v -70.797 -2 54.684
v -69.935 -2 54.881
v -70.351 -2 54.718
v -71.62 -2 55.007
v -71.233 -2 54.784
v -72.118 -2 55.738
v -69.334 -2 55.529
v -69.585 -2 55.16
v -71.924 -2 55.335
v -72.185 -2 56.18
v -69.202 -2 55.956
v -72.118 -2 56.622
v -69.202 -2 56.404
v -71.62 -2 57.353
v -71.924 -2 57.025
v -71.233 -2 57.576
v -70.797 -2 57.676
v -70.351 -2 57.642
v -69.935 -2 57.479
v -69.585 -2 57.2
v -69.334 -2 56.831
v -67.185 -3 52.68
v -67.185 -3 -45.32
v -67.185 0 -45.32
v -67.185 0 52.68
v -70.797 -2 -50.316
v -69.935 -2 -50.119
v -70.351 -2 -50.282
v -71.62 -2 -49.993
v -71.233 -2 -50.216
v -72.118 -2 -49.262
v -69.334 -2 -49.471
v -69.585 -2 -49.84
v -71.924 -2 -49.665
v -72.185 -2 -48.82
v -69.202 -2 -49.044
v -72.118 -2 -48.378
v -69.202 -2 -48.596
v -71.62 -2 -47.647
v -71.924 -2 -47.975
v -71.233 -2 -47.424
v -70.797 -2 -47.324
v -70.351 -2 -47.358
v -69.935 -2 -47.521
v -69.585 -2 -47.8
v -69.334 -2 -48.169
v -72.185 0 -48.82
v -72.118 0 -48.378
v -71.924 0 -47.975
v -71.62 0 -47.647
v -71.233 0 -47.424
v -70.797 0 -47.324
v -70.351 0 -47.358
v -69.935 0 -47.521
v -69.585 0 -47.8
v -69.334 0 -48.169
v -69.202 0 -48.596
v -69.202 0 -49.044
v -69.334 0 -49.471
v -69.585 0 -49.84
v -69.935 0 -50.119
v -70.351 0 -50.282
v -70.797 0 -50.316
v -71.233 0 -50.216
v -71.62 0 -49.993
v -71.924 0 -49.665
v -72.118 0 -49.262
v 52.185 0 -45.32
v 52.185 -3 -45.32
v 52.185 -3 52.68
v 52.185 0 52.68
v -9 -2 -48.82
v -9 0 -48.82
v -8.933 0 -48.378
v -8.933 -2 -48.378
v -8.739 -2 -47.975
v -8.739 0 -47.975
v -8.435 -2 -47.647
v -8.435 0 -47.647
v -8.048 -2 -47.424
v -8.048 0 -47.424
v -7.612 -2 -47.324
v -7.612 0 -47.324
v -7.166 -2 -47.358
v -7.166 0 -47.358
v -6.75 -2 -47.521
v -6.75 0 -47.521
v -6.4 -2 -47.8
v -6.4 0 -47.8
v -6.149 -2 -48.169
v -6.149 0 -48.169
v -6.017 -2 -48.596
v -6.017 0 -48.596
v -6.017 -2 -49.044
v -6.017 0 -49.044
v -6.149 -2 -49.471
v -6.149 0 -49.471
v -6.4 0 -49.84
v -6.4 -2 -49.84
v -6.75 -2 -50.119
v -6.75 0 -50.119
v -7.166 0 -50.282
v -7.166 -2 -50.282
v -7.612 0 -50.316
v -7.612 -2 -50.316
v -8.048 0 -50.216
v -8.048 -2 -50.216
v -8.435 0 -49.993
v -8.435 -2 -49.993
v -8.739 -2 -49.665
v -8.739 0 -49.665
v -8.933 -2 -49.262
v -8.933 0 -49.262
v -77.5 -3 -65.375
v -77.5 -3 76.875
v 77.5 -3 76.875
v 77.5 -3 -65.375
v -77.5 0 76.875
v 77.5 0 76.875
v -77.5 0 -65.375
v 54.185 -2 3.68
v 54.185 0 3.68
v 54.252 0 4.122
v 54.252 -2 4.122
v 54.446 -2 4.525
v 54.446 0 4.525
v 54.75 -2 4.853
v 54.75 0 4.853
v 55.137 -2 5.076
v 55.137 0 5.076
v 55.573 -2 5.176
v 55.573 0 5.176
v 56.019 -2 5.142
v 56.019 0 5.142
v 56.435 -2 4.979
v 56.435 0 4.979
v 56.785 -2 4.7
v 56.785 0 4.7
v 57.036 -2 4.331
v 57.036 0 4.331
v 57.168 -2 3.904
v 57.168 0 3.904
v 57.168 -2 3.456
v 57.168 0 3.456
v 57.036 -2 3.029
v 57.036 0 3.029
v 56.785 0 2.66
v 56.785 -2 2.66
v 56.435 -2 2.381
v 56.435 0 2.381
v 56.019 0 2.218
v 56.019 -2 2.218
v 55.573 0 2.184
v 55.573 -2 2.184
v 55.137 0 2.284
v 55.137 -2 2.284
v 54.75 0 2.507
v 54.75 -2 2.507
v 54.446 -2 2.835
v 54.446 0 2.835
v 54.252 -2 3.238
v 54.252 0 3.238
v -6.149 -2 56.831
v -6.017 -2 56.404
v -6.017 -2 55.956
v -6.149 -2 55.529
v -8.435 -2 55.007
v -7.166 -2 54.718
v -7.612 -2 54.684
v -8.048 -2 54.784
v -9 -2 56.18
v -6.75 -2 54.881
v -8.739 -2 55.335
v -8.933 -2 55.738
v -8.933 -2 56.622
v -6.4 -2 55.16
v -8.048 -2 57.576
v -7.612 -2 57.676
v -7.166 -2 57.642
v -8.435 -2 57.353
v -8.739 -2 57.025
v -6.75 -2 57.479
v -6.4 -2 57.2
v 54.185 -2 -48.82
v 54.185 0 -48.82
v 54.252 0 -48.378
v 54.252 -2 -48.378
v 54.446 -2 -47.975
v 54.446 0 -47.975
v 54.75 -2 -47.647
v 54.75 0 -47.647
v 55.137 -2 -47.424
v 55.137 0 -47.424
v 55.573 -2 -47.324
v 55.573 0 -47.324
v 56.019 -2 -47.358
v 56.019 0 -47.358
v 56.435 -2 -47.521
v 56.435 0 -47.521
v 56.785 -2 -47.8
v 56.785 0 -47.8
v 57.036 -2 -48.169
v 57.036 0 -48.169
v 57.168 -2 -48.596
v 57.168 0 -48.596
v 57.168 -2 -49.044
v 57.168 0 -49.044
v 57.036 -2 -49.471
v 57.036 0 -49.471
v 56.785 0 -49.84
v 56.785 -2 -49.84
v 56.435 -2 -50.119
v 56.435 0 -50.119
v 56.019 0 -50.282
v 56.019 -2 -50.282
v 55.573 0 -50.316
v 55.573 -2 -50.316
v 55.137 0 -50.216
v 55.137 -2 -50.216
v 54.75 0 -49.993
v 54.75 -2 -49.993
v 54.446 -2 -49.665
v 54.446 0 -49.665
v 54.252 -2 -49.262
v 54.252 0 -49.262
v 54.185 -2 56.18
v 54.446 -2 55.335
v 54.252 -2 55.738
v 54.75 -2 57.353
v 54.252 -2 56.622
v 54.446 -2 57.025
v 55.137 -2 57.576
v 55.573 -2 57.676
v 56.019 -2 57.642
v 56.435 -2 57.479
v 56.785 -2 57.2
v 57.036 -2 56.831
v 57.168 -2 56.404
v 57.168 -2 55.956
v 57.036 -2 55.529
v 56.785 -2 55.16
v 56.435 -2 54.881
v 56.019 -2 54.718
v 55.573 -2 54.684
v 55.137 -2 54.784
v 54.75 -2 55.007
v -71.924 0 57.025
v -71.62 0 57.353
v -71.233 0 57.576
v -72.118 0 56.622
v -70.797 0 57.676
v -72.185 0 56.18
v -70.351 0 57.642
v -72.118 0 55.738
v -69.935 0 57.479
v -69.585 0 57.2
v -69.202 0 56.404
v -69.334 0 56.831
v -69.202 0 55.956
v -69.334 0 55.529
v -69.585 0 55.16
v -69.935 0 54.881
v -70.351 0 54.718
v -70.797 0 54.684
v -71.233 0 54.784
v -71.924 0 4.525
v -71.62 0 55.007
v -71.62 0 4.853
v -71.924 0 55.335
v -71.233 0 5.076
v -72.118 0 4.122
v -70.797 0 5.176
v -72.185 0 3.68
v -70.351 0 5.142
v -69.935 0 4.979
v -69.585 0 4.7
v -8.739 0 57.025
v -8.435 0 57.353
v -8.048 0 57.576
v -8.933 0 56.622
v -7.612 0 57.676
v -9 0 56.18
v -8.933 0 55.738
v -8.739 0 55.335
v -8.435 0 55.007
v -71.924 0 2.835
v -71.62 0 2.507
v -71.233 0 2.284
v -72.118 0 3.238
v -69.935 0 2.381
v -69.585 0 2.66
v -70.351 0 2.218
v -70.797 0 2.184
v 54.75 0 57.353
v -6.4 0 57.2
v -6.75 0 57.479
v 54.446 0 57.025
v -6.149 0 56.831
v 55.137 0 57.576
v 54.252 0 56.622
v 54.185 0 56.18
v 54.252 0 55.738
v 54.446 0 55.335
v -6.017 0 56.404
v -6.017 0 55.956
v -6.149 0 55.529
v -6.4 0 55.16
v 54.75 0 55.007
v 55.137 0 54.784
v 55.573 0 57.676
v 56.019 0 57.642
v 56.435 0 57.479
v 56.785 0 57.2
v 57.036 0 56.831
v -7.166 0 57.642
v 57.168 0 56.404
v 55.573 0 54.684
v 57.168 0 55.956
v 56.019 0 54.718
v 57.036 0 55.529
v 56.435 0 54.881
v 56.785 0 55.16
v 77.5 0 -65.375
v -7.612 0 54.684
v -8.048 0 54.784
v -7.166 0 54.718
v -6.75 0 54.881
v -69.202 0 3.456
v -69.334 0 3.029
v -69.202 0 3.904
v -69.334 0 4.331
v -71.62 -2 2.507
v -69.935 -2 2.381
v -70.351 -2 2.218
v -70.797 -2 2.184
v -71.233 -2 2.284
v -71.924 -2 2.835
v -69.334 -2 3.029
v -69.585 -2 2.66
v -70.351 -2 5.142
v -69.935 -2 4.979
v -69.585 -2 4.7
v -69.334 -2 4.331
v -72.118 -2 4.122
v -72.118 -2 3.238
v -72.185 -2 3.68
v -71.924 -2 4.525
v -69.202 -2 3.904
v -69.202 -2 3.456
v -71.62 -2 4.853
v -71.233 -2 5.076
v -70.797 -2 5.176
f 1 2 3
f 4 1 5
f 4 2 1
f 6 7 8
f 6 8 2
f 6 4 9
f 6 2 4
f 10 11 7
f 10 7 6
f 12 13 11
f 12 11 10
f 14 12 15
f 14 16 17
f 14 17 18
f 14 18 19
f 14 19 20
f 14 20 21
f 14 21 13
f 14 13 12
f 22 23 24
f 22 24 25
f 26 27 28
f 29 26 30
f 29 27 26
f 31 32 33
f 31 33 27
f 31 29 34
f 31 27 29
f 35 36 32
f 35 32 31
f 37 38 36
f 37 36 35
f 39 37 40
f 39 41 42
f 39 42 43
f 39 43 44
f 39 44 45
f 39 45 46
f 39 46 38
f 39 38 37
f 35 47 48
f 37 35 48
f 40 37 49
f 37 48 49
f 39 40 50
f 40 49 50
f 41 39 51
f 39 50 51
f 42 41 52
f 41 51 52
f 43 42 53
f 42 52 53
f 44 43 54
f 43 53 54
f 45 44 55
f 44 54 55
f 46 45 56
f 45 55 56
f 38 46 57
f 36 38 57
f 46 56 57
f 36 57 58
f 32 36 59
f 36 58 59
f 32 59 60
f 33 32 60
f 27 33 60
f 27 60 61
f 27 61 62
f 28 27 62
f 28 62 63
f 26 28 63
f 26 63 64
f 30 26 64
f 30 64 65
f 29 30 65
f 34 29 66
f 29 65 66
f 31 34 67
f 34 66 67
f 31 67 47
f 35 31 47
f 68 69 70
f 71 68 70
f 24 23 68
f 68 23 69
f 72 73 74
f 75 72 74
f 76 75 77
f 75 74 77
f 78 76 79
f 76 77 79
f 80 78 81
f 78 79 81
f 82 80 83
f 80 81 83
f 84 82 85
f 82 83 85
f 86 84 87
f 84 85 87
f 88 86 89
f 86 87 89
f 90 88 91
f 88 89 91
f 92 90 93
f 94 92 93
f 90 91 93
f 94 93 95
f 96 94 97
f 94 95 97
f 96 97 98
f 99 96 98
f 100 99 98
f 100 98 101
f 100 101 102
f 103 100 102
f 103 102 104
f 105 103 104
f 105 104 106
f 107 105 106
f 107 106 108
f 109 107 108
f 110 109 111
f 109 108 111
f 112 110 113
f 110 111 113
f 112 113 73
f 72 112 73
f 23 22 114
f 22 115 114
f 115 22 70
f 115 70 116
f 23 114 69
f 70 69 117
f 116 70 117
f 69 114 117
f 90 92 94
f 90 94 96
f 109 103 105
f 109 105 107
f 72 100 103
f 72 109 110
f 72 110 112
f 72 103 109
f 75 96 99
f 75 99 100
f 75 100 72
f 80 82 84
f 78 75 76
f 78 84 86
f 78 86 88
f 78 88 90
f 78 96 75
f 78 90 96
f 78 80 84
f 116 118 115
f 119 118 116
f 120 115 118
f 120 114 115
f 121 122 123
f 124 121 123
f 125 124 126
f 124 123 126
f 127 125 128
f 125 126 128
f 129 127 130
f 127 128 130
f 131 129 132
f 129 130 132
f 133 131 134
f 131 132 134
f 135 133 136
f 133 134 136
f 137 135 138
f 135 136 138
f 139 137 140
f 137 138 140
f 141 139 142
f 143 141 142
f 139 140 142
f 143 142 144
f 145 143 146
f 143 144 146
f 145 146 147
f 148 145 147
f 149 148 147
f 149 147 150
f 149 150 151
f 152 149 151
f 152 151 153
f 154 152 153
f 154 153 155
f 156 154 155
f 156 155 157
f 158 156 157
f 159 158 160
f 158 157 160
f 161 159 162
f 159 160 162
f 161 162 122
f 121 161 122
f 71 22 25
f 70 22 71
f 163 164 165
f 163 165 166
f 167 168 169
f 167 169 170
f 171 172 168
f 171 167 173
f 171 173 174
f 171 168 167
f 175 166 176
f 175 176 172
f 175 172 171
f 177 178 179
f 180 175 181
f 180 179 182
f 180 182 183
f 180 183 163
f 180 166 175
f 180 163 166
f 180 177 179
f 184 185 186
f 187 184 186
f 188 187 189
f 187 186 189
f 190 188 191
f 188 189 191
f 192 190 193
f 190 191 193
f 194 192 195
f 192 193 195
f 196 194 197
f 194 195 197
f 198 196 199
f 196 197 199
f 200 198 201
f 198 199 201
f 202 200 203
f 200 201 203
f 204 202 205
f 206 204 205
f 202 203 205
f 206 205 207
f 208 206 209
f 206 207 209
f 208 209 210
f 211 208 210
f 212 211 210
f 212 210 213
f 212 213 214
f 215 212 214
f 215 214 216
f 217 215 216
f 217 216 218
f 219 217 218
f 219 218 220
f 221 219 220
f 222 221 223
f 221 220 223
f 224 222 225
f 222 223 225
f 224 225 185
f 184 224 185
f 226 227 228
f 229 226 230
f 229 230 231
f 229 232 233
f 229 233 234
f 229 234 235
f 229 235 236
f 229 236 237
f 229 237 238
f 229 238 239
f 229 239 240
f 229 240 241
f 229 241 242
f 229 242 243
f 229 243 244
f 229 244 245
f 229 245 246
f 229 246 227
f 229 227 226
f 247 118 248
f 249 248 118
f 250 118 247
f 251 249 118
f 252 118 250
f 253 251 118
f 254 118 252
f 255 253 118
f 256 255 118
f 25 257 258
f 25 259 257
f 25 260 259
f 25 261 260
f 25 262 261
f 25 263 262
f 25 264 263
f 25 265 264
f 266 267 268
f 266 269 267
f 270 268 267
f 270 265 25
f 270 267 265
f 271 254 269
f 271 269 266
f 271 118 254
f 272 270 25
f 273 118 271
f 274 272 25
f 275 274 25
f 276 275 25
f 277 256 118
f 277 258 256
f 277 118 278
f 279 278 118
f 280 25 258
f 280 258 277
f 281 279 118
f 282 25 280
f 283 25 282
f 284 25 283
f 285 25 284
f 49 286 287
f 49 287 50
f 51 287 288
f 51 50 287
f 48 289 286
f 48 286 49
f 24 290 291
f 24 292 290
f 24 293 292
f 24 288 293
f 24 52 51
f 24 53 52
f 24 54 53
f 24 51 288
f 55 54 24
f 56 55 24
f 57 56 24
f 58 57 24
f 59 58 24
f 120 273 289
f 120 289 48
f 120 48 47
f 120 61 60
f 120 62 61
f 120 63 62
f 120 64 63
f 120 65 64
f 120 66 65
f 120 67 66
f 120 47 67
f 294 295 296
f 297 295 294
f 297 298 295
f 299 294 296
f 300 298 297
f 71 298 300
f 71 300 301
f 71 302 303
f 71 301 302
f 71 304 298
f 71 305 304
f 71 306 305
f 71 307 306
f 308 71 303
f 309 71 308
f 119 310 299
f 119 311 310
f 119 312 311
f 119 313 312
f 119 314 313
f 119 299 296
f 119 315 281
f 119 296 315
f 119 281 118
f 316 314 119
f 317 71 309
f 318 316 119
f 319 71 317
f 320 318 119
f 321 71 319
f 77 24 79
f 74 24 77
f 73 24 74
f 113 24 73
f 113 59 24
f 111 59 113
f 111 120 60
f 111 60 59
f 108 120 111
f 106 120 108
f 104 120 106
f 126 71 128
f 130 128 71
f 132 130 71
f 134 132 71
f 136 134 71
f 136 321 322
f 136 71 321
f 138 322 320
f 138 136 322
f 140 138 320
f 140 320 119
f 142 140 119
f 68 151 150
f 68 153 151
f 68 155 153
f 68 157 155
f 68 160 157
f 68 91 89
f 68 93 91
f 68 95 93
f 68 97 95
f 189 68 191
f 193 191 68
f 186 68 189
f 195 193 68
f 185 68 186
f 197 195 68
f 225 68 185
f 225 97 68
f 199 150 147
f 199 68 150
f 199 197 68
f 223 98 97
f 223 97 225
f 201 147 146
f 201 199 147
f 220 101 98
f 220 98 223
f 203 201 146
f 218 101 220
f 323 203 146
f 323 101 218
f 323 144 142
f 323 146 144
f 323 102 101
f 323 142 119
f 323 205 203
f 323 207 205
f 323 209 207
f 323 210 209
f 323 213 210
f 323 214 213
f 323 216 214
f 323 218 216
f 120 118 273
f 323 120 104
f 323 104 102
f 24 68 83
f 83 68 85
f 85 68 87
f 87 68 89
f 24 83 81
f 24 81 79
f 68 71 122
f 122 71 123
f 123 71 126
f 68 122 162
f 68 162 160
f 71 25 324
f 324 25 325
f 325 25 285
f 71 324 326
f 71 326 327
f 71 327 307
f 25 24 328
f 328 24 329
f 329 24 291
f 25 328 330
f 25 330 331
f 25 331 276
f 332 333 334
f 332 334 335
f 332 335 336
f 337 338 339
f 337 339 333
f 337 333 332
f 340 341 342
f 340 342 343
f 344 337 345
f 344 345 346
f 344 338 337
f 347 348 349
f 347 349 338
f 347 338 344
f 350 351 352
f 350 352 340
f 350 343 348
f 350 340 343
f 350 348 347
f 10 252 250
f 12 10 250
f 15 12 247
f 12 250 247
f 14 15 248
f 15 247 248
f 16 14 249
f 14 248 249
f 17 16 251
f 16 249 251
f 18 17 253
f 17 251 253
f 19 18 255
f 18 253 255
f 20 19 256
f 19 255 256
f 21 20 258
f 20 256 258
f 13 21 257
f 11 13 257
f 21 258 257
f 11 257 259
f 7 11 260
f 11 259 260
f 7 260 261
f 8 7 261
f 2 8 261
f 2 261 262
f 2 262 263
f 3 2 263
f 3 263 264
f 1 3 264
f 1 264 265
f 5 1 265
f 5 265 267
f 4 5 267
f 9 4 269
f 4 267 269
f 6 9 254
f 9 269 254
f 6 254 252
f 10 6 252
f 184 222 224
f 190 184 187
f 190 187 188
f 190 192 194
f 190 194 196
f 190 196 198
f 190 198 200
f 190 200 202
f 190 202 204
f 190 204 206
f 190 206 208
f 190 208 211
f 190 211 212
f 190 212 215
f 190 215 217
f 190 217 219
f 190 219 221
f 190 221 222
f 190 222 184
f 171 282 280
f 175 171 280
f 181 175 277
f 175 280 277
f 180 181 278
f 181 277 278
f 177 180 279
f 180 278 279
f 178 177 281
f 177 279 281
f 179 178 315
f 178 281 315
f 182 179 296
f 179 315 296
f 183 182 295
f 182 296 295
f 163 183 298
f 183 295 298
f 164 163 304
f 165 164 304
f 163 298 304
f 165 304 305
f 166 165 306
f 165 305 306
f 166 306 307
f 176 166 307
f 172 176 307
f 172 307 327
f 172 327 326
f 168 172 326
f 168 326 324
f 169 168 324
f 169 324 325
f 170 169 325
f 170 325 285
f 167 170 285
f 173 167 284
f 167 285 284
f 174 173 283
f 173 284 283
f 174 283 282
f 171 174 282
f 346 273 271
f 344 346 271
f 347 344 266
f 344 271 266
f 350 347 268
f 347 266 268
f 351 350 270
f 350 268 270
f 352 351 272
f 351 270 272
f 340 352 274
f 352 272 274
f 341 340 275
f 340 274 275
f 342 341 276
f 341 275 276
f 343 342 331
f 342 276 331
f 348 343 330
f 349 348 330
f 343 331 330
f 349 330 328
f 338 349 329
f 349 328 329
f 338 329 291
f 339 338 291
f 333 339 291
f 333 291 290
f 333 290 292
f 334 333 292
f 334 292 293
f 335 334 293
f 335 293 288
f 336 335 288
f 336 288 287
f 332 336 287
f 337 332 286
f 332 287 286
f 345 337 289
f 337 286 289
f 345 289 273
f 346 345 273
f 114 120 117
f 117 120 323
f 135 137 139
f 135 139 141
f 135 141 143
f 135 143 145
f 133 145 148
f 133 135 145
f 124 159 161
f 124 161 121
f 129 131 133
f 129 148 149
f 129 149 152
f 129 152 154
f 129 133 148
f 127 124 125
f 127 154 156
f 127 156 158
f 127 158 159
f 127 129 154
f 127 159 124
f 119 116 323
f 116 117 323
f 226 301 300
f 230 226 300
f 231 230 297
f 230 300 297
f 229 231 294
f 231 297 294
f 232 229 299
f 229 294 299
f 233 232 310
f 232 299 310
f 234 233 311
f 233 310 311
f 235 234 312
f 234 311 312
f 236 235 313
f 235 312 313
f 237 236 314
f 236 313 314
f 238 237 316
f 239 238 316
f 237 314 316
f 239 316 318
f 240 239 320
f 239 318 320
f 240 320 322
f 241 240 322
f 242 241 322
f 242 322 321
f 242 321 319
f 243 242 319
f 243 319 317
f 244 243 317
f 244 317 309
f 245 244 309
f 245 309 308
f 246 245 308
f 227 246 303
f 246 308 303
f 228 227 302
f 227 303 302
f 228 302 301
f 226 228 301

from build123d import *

# Parameters (mm, degrees)
F0_W     = 155
F0_H     = 130.75
F1_DEPTH = 3
F2_W     = 113.37
F2_H     = 92
F3_DEPTH = 25
F4_W     = 119.37
F4_H     = 98
F5_DEPTH = 25
F6_R     = 1.5
F7_DEPTH = 2
F8_W     = 155
F8_H     = 3
F9_DEPTH = 11.5


with BuildPart() as f1:
    # F0 (on Front) → F1 (new body)
    with BuildSketch(Plane.XZ):
        Rectangle(F0_W, F0_H)
    extrude(amount=F1_DEPTH)

    # F2 (on face) → F3 (cut)
    with BuildSketch(Plane(origin=(0, 0, 0), x_dir=(-1, 0, 0), z_dir=(0, 1, 0))):
        with Locations((7.5, 3.68)):
            Rectangle(F2_W, F2_H)
    extrude(amount=-F3_DEPTH, mode=Mode.SUBTRACT)

    # F4 (on face) → F5 (cut)
    with BuildSketch(Plane.XZ.offset(3)):
        with Locations((-7.5, 3.68)):
            Rectangle(F4_W, F4_H)
    extrude(amount=-F5_DEPTH, mode=Mode.SUBTRACT)

    # F6 (on face) → F7 (cut)
    with BuildSketch(Plane(origin=(0, 0, 0), x_dir=(-1, 0, 0), z_dir=(0, 1, 0))):
        with Locations((-55.685, 56.18)):
            Circle(F6_R)
        with Locations((70.685, 56.18)):
            Circle(F6_R)
        with Locations((70.685, -48.82)):
            Circle(F6_R)
        with Locations((-55.685, -48.82)):
            Circle(F6_R)
        with Locations((7.5, -48.82)):
            Circle(F6_R)
        with Locations((-55.685, 3.68)):
            Circle(F6_R)
        with Locations((70.685, 3.68)):
            Circle(F6_R)
        with Locations((7.5, 56.18)):
            Circle(F6_R)
    extrude(amount=-F7_DEPTH, mode=Mode.SUBTRACT)

    # F8 (on face) → F9 (join)
    with BuildSketch(Plane.XY.offset(65.375)):
        with Locations((0, -1.5)):
            Rectangle(F8_W, F8_H)
    extrude(amount=F9_DEPTH)


solid = f1.part
